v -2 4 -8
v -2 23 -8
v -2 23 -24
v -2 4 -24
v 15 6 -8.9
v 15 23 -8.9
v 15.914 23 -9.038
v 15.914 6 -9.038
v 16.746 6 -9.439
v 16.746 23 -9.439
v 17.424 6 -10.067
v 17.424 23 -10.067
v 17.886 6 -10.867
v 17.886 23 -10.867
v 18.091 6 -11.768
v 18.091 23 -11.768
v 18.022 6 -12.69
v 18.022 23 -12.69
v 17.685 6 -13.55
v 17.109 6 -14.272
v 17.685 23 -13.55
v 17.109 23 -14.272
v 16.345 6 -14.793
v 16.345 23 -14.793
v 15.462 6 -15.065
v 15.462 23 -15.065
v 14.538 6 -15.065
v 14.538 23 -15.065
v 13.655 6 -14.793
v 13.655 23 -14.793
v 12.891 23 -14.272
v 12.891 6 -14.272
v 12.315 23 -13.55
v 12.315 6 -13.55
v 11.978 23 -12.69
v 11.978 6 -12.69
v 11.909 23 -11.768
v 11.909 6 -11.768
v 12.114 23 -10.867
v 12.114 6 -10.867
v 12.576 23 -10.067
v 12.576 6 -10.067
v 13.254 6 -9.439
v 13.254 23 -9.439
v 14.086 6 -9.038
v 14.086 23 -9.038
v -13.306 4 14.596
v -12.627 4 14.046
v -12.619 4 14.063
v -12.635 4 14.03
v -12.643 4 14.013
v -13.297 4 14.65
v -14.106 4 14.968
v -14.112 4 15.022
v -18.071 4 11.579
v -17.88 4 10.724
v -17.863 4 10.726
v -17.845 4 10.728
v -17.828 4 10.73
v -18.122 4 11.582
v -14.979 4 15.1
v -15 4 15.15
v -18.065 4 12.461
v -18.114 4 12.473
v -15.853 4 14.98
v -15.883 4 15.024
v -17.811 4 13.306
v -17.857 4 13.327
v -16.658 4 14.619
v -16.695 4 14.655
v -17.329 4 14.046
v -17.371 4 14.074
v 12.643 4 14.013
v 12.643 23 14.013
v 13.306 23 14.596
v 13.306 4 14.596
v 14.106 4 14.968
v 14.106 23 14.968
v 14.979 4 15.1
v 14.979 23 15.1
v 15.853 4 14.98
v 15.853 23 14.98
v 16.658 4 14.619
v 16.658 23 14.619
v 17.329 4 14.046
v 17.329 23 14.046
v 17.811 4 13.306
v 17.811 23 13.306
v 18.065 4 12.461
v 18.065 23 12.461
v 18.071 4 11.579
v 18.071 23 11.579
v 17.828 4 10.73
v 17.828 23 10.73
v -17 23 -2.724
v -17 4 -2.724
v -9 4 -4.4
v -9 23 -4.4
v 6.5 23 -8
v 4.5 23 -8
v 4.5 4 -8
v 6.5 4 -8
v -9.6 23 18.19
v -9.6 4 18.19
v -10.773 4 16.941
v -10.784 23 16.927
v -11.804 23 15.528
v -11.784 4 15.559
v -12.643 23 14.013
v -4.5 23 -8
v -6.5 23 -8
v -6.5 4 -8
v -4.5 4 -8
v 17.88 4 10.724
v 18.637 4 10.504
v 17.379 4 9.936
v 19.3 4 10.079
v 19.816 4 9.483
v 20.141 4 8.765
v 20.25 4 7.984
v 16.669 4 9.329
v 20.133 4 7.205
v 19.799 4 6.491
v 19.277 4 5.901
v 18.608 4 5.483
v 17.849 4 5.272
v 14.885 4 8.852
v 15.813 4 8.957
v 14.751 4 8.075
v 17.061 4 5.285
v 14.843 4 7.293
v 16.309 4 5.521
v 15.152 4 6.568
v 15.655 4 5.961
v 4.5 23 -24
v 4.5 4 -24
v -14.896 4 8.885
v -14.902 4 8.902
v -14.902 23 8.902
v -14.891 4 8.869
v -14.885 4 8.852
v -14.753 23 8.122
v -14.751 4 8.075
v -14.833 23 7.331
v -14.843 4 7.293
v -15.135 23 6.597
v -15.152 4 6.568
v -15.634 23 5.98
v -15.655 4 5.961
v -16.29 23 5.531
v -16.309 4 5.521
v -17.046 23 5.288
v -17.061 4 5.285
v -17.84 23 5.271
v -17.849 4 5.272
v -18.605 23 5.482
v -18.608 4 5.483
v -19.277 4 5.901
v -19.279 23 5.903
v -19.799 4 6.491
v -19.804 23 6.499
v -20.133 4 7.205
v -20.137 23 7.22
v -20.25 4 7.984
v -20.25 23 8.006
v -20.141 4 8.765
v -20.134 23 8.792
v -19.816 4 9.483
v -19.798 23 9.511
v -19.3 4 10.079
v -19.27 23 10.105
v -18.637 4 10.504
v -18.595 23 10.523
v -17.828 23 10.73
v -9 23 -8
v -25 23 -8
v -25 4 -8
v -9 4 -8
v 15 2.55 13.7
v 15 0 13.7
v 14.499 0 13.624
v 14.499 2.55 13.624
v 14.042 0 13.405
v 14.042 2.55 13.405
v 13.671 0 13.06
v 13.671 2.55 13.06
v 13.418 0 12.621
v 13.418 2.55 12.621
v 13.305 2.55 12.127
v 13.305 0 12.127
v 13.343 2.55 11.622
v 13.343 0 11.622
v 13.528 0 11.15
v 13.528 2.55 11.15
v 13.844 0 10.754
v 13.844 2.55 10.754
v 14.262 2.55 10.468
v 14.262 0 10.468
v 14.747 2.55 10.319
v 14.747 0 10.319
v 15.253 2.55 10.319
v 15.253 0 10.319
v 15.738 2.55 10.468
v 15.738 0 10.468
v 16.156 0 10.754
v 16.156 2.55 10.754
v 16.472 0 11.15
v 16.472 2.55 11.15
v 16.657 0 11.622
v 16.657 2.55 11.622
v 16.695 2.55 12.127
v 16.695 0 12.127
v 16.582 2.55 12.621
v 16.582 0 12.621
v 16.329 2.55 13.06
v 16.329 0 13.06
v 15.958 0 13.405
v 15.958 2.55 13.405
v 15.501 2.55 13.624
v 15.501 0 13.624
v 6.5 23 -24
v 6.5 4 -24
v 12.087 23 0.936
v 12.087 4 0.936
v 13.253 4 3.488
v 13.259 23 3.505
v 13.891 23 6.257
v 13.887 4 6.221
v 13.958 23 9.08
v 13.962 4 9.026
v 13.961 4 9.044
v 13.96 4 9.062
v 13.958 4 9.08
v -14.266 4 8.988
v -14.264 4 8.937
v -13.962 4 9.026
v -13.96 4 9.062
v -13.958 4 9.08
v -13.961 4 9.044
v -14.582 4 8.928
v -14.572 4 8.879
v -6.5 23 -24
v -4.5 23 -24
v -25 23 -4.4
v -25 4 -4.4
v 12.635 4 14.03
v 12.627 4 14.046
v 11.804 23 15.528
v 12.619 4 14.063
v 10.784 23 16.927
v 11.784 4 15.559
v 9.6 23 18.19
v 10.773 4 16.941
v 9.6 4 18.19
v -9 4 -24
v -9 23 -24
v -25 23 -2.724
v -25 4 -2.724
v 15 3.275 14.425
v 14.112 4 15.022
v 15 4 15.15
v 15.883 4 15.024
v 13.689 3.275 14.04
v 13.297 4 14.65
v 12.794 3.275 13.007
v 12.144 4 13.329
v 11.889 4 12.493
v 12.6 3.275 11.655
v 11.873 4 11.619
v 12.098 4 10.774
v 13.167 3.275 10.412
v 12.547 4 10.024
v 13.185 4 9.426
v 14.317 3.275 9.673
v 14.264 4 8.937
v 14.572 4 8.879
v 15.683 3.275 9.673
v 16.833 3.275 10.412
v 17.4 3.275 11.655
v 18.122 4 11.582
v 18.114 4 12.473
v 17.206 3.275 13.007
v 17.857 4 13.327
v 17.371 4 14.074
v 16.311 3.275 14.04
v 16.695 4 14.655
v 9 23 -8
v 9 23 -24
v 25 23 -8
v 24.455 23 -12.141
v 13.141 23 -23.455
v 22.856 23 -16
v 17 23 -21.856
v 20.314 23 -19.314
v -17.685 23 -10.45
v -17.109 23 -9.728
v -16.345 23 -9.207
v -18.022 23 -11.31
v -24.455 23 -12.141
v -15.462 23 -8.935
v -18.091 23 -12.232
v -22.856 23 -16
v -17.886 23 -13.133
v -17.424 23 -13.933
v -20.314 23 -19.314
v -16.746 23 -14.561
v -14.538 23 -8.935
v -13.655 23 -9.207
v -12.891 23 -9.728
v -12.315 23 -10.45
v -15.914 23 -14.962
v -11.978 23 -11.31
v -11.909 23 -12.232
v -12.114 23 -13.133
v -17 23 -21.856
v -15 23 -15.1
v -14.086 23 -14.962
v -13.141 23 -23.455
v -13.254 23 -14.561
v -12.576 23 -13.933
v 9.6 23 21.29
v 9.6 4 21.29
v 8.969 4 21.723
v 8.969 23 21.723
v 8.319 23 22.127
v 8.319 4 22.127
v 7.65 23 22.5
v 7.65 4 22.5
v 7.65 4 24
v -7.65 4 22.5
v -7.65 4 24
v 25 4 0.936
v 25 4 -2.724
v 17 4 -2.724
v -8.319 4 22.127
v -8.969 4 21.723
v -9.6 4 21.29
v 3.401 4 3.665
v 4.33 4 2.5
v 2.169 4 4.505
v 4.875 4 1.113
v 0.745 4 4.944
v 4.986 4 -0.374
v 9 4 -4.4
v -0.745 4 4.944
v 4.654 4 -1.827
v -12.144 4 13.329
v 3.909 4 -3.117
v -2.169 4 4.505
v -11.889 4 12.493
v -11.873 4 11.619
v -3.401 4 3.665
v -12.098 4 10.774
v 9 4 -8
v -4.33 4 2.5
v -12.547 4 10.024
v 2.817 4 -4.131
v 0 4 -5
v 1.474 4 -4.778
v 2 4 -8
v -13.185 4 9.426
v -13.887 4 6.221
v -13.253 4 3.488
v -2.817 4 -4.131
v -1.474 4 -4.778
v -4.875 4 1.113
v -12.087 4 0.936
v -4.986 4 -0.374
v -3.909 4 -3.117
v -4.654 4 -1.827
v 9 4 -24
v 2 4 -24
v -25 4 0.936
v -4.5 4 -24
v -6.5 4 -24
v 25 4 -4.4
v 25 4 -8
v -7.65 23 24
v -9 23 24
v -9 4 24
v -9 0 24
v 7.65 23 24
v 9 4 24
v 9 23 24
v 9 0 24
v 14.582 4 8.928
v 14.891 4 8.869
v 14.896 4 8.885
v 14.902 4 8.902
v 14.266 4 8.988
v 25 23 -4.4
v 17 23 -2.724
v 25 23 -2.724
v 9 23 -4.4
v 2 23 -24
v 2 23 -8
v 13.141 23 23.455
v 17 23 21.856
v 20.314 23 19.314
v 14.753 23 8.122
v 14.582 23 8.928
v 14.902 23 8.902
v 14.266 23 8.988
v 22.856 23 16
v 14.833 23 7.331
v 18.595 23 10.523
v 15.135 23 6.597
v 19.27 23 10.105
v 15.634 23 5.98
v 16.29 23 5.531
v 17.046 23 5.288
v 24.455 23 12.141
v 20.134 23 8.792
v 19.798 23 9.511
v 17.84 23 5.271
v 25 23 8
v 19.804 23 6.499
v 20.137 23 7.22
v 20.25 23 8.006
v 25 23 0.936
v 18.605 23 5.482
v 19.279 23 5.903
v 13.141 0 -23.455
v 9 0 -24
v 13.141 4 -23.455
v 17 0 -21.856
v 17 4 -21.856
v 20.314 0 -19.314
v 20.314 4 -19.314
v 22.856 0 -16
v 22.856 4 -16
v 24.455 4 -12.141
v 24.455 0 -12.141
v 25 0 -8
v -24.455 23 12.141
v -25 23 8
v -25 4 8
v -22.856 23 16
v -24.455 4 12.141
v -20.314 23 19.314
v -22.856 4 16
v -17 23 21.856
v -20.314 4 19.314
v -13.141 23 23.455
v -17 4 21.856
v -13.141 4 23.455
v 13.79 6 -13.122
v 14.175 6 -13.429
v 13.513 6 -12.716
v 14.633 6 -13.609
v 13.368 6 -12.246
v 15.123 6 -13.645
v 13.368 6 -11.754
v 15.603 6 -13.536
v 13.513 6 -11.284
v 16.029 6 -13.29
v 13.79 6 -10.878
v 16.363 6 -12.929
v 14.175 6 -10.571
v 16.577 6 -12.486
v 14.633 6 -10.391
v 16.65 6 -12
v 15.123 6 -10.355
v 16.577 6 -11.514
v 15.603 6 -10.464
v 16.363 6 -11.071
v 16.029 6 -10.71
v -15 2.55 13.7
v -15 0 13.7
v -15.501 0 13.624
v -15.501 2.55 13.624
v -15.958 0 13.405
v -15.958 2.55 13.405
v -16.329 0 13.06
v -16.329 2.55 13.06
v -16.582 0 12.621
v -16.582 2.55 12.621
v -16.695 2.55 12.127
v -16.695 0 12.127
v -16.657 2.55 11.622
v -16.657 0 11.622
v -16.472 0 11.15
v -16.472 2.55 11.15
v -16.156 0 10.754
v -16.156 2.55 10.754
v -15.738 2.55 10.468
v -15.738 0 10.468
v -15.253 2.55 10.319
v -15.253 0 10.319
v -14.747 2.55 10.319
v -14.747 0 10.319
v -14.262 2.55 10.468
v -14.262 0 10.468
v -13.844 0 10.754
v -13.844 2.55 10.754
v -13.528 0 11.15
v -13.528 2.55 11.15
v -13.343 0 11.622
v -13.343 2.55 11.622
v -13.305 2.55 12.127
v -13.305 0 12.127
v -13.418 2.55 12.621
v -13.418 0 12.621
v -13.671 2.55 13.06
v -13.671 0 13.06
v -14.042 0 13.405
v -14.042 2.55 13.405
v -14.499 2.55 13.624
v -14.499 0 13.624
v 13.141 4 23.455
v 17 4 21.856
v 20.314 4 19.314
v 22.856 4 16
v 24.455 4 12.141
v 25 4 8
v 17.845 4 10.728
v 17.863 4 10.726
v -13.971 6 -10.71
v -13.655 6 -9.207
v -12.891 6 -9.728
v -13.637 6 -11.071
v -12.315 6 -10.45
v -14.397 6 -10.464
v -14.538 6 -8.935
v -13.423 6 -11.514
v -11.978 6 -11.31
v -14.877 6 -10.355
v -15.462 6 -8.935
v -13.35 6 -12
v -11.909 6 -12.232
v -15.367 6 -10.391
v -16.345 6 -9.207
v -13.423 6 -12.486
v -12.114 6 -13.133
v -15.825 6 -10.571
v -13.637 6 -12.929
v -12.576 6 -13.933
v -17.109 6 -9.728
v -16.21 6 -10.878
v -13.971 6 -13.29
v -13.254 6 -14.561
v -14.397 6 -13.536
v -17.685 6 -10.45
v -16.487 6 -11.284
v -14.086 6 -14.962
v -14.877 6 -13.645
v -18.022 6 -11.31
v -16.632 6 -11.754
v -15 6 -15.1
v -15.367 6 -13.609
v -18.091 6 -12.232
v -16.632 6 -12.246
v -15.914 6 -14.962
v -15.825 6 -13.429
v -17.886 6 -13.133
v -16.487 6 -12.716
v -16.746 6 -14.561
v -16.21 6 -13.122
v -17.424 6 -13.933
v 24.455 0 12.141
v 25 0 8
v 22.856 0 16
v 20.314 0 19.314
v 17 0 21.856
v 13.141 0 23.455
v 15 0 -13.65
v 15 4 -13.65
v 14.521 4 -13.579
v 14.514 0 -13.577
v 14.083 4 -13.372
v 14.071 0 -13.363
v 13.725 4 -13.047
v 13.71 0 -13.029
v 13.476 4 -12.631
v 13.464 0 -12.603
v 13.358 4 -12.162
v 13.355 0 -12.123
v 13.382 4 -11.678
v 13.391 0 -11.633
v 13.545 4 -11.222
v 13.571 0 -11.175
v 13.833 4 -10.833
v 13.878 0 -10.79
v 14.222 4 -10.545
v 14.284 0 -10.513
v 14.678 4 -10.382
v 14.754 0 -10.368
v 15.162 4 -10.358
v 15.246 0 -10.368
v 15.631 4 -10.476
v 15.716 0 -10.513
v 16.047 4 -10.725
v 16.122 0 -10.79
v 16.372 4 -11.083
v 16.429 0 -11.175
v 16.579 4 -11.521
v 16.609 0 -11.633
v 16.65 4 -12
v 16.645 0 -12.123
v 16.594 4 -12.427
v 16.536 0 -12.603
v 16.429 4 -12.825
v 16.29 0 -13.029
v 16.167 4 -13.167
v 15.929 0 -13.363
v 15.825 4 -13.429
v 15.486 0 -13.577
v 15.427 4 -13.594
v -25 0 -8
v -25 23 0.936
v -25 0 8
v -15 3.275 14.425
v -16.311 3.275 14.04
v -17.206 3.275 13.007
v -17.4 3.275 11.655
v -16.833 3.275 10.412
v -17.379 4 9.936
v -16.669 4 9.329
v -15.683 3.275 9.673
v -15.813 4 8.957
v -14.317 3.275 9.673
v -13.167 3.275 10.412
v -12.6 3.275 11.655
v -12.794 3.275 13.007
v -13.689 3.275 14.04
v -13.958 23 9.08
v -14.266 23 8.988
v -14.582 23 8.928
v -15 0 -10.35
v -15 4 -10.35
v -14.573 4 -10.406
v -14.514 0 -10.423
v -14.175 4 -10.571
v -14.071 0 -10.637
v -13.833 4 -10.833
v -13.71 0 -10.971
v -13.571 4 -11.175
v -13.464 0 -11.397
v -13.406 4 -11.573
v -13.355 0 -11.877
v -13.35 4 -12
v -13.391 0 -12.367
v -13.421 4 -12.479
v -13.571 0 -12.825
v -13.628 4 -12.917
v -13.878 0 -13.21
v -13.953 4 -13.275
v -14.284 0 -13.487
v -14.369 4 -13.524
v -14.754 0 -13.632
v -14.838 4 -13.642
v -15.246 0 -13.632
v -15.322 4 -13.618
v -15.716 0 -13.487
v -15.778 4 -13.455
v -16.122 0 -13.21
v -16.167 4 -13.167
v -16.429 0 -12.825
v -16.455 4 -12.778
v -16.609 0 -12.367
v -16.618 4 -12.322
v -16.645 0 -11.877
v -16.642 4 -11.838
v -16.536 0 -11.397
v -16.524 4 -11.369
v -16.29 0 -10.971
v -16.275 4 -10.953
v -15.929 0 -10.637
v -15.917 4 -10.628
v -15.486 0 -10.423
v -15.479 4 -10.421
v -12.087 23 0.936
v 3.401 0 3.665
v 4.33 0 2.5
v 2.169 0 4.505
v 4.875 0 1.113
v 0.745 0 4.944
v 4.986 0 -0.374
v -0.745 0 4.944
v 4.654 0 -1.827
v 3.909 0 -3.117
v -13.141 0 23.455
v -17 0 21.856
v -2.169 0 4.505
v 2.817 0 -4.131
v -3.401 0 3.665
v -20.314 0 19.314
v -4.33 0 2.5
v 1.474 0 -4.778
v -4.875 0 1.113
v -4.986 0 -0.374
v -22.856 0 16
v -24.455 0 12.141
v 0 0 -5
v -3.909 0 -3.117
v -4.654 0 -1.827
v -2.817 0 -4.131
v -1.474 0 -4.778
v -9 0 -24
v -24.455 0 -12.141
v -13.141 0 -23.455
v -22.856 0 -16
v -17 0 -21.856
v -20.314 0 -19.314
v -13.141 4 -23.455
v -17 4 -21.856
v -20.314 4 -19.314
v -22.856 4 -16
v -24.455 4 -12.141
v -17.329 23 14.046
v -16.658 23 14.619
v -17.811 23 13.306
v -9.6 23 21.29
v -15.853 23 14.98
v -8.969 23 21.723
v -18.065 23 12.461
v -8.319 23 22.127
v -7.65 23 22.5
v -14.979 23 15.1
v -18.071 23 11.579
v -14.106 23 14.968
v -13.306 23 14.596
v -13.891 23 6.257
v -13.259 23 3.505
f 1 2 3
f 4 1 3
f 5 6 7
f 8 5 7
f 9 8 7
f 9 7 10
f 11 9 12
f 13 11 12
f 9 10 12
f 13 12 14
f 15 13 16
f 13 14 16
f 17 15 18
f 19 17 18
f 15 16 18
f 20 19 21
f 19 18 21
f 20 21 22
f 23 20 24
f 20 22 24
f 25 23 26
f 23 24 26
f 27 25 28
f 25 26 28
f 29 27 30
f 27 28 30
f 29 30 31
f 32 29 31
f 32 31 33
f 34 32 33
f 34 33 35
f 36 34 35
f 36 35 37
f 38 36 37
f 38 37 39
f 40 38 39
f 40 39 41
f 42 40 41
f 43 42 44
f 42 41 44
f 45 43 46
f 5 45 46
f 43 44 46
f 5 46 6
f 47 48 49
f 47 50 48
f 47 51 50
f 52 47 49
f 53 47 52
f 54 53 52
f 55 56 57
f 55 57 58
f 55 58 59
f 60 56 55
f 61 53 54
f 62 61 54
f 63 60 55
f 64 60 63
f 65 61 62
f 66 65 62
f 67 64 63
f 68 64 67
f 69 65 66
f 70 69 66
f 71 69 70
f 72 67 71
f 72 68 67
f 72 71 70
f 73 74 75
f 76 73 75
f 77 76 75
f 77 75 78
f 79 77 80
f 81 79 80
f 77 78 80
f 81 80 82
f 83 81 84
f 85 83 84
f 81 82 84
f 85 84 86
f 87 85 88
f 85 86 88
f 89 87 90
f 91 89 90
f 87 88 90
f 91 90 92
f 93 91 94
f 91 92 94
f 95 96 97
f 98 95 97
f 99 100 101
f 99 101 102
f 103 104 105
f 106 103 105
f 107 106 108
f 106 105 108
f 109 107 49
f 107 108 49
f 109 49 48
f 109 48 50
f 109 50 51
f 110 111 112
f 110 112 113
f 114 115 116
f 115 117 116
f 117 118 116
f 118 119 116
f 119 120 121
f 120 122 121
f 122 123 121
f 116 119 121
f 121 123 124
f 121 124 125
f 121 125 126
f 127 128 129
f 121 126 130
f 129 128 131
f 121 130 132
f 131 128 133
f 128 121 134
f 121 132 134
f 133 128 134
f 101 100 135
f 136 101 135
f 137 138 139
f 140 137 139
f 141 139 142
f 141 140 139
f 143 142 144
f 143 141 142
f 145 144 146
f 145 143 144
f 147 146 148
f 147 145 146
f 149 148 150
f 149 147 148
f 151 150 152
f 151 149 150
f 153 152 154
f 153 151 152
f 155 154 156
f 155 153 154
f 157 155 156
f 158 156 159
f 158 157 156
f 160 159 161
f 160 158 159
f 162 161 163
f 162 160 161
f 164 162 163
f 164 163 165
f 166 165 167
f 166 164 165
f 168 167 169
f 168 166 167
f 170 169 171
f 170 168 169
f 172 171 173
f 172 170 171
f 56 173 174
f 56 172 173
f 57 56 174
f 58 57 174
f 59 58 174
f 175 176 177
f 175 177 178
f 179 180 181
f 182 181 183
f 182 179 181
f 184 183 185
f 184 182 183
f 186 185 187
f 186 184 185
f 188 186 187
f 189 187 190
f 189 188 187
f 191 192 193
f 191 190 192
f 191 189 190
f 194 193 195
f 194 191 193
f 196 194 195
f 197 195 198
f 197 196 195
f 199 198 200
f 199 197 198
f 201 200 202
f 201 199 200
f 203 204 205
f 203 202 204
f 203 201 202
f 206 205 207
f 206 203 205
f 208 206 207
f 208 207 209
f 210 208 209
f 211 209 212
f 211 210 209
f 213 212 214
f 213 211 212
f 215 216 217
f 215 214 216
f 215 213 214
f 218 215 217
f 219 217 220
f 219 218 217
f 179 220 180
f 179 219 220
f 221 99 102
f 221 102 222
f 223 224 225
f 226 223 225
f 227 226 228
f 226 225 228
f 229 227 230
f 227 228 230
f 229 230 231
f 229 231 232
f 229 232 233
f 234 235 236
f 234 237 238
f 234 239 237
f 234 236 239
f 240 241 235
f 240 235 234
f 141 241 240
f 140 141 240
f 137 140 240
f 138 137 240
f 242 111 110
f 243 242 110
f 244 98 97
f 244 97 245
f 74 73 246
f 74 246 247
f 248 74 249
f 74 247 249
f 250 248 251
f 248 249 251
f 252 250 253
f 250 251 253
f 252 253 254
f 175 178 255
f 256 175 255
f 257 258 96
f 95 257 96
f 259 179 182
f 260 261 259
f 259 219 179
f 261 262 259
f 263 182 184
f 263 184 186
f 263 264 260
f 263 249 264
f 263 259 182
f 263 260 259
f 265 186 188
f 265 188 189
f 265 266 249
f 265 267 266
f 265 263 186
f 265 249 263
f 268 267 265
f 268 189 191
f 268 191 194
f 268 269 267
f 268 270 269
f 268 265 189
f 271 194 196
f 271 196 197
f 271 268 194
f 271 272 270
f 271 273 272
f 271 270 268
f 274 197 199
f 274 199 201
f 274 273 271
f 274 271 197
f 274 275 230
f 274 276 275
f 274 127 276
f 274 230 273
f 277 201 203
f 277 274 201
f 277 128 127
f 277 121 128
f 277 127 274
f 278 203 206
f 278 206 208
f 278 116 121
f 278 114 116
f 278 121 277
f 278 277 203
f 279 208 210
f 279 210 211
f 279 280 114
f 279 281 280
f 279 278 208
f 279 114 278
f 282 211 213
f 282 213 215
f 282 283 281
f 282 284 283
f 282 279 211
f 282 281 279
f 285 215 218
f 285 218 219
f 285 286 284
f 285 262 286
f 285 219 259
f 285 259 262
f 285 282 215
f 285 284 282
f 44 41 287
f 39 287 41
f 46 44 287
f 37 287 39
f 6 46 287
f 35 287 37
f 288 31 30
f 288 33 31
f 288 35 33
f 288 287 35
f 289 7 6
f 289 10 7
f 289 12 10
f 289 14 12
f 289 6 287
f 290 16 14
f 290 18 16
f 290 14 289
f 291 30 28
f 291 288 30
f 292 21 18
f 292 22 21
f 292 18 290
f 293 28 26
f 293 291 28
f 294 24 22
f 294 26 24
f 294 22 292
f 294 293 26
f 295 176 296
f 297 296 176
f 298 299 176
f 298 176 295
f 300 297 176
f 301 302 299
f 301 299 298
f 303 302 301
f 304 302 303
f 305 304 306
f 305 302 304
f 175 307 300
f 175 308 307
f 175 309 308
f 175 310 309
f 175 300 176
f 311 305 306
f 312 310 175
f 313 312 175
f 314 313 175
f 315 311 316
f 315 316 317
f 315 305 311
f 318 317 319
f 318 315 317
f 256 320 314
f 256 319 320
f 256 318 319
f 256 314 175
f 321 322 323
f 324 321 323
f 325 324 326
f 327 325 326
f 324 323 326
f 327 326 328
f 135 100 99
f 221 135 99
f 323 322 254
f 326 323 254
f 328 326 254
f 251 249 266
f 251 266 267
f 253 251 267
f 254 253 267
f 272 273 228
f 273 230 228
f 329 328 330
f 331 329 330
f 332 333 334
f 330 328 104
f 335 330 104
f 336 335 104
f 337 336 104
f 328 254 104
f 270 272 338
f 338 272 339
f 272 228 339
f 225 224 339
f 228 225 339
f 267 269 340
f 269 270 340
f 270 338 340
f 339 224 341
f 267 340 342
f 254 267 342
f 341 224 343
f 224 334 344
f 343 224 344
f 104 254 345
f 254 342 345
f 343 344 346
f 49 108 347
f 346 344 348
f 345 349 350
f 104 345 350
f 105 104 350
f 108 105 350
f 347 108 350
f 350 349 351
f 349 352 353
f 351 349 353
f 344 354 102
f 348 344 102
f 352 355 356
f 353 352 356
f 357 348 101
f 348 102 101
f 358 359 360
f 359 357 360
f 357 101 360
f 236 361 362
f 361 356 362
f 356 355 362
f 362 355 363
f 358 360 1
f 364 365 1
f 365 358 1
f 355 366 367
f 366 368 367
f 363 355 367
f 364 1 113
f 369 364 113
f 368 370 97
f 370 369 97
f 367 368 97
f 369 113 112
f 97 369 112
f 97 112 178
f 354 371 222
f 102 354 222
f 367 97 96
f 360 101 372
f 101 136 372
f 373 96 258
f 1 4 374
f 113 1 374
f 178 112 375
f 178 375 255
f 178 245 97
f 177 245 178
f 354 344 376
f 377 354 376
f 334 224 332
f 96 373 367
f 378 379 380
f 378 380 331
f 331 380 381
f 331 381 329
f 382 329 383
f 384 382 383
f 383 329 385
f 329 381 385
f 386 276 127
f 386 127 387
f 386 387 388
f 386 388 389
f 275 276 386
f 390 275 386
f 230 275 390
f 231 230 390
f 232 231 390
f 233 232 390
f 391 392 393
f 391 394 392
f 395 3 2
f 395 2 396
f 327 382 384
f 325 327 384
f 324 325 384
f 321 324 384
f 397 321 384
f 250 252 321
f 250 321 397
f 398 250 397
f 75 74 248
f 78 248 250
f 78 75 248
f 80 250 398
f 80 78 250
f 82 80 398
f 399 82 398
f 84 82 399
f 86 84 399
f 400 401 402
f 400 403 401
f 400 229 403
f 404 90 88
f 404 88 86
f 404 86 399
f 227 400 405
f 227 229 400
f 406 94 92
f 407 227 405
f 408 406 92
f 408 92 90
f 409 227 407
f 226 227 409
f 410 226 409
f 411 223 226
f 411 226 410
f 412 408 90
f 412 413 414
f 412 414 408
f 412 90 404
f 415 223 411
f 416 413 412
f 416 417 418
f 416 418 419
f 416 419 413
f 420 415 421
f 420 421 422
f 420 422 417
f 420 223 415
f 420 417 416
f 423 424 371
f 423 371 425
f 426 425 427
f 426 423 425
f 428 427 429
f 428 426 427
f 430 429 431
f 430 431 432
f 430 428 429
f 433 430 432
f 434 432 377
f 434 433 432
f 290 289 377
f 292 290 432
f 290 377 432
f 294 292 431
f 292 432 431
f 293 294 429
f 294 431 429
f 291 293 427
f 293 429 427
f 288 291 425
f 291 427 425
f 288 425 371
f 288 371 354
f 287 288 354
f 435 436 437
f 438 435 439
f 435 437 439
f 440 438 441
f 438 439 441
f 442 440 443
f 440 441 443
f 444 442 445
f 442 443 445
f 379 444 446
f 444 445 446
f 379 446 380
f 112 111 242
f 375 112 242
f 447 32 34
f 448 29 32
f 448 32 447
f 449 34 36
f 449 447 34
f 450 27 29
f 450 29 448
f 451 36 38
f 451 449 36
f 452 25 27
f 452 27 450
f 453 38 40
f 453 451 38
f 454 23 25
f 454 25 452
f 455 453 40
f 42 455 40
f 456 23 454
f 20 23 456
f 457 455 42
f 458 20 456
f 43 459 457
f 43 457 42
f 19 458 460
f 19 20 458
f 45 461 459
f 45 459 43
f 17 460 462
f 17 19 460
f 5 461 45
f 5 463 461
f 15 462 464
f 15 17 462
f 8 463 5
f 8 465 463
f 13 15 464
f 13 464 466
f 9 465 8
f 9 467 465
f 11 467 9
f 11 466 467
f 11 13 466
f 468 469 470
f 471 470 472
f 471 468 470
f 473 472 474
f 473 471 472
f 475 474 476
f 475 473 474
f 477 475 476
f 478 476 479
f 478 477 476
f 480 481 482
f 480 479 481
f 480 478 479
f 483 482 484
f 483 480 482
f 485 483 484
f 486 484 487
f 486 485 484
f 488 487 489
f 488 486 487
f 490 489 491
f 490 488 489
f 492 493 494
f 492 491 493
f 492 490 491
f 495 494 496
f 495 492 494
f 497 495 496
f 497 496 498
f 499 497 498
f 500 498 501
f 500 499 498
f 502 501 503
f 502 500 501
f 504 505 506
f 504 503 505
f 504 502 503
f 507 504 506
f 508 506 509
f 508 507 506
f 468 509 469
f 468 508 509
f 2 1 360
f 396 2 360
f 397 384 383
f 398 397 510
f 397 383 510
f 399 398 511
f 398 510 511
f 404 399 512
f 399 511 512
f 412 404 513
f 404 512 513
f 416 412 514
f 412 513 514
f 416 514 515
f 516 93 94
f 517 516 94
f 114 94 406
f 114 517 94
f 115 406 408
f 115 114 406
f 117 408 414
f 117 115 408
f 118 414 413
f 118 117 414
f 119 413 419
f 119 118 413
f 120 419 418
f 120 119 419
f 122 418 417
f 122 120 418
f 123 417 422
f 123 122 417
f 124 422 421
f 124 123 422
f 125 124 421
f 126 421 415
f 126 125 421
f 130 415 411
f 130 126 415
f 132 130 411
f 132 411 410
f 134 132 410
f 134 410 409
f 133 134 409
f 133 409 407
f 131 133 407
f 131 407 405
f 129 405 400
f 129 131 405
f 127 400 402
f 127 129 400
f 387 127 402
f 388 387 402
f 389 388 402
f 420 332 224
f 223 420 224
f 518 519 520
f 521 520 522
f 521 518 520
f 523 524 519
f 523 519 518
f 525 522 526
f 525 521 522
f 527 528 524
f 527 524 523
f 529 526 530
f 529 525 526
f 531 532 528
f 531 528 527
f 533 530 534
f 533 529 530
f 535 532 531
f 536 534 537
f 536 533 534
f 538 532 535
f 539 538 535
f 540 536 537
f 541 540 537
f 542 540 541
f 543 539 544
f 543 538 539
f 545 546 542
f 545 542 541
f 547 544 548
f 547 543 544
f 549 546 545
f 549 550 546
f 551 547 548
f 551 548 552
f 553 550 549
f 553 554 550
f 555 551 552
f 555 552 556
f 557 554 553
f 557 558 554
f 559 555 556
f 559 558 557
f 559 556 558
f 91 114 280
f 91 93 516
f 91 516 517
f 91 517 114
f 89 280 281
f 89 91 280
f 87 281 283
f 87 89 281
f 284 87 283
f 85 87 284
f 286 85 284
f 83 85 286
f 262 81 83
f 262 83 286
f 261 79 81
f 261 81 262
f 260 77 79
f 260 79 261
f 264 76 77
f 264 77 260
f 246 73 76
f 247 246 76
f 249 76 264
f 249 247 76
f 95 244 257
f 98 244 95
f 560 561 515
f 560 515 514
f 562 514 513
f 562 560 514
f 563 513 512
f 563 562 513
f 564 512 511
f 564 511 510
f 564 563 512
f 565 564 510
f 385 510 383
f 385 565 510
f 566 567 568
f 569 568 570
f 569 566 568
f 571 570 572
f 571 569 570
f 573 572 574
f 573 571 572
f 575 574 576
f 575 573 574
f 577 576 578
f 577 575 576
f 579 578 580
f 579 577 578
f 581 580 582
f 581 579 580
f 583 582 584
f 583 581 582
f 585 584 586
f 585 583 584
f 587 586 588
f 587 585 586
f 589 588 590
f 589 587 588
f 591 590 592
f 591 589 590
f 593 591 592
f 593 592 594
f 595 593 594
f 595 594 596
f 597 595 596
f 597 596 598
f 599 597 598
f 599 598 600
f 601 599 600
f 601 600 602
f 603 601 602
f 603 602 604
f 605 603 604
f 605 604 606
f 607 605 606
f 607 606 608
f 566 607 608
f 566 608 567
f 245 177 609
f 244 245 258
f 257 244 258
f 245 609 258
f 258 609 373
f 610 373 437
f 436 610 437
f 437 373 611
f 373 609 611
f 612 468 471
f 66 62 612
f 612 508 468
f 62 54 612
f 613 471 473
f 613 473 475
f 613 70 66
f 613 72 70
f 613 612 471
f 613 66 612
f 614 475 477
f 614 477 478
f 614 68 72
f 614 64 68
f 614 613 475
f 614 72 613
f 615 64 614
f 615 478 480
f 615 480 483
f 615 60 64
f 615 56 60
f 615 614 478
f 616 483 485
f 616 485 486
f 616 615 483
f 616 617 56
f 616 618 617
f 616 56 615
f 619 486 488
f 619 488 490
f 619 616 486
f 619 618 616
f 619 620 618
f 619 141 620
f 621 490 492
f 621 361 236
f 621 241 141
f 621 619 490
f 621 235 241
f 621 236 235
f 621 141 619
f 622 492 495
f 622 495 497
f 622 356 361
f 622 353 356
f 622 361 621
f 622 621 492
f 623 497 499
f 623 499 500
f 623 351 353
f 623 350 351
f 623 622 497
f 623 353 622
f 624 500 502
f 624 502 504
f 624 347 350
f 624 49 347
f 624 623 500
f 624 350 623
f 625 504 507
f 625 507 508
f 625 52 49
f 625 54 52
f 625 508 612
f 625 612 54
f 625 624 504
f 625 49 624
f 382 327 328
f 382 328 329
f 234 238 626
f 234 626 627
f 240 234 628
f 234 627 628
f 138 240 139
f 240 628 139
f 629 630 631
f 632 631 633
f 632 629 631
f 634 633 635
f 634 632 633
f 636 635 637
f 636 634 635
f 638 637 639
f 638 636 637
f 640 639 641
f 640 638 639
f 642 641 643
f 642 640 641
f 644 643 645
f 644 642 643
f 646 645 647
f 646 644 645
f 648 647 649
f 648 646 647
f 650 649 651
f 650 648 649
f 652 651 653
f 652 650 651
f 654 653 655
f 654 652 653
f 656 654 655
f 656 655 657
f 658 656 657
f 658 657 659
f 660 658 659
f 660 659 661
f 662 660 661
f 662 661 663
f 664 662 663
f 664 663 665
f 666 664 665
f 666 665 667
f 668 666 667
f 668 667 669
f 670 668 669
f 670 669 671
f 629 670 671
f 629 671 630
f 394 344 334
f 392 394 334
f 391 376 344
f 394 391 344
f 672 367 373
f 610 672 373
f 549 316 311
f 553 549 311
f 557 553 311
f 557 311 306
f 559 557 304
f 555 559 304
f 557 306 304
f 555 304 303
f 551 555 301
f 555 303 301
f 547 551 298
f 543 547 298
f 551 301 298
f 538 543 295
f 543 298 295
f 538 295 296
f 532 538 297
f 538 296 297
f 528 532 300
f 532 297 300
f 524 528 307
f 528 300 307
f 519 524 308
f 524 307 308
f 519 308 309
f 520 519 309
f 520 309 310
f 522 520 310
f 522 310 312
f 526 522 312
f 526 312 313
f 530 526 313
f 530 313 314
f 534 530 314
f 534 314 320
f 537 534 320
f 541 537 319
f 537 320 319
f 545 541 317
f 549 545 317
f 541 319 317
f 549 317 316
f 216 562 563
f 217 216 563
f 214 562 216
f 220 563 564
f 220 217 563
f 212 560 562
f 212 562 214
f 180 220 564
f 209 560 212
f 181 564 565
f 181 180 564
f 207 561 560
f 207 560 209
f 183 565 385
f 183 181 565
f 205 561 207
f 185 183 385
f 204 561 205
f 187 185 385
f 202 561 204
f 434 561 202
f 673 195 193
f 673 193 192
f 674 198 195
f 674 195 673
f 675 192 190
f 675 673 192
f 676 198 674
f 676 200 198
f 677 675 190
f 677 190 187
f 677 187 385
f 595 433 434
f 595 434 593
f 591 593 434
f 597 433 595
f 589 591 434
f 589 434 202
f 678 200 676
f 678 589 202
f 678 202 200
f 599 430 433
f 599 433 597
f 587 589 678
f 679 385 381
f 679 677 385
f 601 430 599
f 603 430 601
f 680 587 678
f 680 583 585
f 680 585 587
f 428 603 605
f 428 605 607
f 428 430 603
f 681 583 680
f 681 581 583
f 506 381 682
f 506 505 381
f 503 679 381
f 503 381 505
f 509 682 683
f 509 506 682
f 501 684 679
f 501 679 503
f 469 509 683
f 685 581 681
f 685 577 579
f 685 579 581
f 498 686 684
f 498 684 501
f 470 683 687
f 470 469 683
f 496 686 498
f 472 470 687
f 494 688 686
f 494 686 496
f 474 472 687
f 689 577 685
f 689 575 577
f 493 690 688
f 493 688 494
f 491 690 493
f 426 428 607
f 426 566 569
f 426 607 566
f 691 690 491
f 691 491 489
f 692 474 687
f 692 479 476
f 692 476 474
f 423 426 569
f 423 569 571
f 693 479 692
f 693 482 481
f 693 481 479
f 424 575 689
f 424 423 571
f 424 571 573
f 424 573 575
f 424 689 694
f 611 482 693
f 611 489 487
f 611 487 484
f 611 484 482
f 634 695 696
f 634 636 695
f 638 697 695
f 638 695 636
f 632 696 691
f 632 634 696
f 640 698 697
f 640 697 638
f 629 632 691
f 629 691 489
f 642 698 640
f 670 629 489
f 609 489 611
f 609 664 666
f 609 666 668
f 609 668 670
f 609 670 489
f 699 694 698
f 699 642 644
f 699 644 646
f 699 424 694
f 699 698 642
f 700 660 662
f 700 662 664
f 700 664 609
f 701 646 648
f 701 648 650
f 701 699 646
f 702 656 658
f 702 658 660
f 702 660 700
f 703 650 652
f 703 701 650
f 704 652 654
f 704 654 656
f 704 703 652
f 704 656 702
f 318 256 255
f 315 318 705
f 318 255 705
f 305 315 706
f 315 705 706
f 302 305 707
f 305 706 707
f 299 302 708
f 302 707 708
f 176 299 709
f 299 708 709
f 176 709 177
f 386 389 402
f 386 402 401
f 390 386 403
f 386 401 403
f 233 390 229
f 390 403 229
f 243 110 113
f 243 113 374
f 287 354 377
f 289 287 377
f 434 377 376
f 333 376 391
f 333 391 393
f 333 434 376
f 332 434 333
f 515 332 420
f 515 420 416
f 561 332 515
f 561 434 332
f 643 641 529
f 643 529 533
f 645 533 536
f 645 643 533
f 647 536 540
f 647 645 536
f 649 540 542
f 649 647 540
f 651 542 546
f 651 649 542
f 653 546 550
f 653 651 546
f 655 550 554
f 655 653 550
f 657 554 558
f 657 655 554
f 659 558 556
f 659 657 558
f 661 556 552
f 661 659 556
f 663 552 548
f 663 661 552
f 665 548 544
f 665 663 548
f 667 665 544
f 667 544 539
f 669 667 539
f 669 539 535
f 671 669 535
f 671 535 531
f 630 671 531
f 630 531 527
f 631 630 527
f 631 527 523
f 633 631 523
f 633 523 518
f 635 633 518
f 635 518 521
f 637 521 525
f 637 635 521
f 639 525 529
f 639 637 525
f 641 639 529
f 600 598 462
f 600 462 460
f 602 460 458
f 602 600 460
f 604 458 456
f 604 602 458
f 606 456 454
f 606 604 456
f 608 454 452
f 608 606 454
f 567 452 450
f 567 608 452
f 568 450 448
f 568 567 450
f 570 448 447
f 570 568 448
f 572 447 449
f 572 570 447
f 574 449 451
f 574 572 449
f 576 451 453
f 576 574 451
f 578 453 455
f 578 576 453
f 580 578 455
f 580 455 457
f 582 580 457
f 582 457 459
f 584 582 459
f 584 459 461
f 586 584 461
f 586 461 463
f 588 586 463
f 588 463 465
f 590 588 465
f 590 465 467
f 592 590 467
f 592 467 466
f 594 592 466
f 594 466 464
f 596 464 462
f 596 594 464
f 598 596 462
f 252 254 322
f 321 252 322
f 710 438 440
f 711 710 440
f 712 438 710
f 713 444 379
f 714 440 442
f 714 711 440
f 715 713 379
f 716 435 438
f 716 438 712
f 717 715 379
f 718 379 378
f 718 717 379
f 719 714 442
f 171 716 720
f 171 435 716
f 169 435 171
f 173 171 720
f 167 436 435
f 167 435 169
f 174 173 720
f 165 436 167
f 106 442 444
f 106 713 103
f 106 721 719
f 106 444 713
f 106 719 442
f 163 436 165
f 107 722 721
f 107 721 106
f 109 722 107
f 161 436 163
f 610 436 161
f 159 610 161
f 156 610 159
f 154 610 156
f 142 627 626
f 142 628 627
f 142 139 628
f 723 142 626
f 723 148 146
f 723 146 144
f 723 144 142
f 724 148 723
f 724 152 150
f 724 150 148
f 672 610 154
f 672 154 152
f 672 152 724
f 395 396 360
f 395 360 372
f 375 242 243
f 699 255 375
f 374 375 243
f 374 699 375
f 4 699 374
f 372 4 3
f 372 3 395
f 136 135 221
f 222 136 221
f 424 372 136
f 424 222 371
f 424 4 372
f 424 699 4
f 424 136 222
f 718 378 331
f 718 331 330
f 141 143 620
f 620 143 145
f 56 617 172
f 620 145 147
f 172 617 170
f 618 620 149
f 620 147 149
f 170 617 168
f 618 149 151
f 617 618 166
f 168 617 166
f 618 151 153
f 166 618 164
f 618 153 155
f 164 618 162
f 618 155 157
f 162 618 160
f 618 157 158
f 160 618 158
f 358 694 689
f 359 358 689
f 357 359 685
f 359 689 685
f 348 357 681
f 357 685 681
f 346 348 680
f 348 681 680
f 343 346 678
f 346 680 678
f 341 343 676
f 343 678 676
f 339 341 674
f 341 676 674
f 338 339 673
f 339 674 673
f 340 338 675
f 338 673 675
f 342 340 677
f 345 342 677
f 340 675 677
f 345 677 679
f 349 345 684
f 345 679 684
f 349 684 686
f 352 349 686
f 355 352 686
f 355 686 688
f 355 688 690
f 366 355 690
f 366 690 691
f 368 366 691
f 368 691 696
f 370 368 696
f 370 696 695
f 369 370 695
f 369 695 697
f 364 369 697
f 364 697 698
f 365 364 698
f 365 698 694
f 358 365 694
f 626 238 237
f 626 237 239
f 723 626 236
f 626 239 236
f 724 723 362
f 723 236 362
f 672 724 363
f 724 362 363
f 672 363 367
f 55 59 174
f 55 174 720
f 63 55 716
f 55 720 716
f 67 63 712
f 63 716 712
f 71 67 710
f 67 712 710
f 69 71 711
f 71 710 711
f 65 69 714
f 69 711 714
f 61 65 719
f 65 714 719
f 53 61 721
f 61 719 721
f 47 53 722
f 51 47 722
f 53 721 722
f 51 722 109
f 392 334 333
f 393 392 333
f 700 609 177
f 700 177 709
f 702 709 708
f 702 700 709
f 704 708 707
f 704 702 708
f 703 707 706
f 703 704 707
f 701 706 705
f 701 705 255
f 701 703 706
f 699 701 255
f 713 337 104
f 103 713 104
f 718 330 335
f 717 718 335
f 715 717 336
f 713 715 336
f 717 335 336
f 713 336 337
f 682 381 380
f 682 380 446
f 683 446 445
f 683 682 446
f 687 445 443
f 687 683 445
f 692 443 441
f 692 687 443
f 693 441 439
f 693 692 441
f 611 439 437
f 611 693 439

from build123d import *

# Parameters (mm, degrees)
SKETCH1_R                                    = 1.650000221024274
BOSS_EXTRUDE1_DEPTH                          = 4
BOSS_EXTRUDE2_OUTLINE_R                      = 2.75
BOSS_EXTRUDE2_OUTLINE_R_2                    = 1.650000221
BOSS_EXTRUDE2_OUTLINE_W                      = 2.000000000000001
BOSS_EXTRUDE2_OUTLINE_H                      = 16.000000209
BOSS_EXTRUDE2_OUTLINE_W_2                    = 4
BOSS_EXTRUDE2_DEPTH                          = 19
SKETCH6_R                                    = 3.1000000000000005
SKETCH6_R_2                                  = 3.0999999999999988
CUT_EXTRUDE2_DEPTH                           = 17
SKETCH7_R                                    = 3.1000000000000005
SKETCH7_R_2                                  = 3.0999999999999988
CUT_EXTRUDE3_DEPTH                           = 2
SKETCH11_R                                   = 5
CUT_EXTRUDE4_DEPTH                           = 10
CSK_FOR_M3_CROSS_RECESS_FLAT_HEAD_SC_2_COUNT = 2
CSK_FOR_M3_CROSS_RECESS_FLAT_HEAD_SC_2_PITCH = 29.999999886192118


# Read off the part's stored shape, not the designer's step: Boss-Extrude2
with BuildPart() as part:
    # Sketch1 → Boss-Extrude1 (new body)
    with BuildSketch(Plane(origin=(0, 0, 0), x_dir=(1, 0, 0), z_dir=(0, 1, 0))):
        with BuildLine():
            Line((-9.000000372528914, 24.000000208616257), (9.000000372528918, 24.000000208616257))
            ThreePointArc((9.000000372528918, 24.000000208616257), (20.31370887151379, 19.313708707601016), (25.00000037252903, 8.000000208616145))
            Line((25.00000037252903, 8.000000208616145), (25.00000037252903, -8.000000208616145))
            ThreePointArc((25.00000037252903, -8.000000208616145), (20.31370887151379, -19.313708707601016), (9.000000372528918, -24.000000208616257))
            Line((9.000000372528918, -24.000000208616257), (-9.000000372528914, -24.000000208616257))
            ThreePointArc((-9.000000372528914, -24.000000208616257), (-20.313708871513793, -19.31370870760102), (-25.00000037252903, -8.000000208616145))
            Line((-25.00000037252903, -8.000000208616145), (-25.00000037252903, 8.000000208616145))
            ThreePointArc((-25.00000037252903, 8.000000208616145), (-20.31370887151379, 19.313708707601016), (-9.000000372528914, 24.000000208616257))
        make_face()
        with Locations(Location((-14.999999943096059, 12.000001695688482, 0), (0, 0, 270))):
            Circle(SKETCH1_R, mode=Mode.SUBTRACT)
        with Locations(Location((14.999999943096059, 12.00000169568849, 0), (0, 0, 90))):
            Circle(SKETCH1_R, mode=Mode.SUBTRACT)
        with Locations(Location((14.999999943096059, -12.00000169568849, 0), (0, 0, 270))):
            Circle(SKETCH1_R, mode=Mode.SUBTRACT)
        with Locations(Location((-14.999999943096059, -12.000001695688482, 0), (0, 0, 90))):
            Circle(SKETCH1_R, mode=Mode.SUBTRACT)
    extrude(amount=BOSS_EXTRUDE1_DEPTH)

    # Boss-Extrude2 outline → Boss-Extrude2 (add)
    # profile 1 of 9: a face of its own
    with BuildSketch(Plane(origin=(0, 4, 0), x_dir=(1, 0, 0), z_dir=(0, 1, 0))):
        with BuildLine():
            ThreePointArc((-25.000000373, -8.000000209), (-20.313708872, -19.313708708), (-9.000000373, -24.000000209))
            Line((-9.000000373, -24.000000209), (-7.65, -24.000000209))
            Line((-7.65, -24.000000209), (-7.65, -22.5))
            ThreePointArc((-7.65, -22.5), (-8.646208076, -21.928947768), (-9.6, -21.289563574))
            Line((-9.6, -21.289563574), (-9.6, -18.190191362))
            ThreePointArc((-9.6, -18.190191362), (-11.86645746, -15.428807936), (-13.360259128, -12.183715576))
            ThreePointArc((-13.360259128, -12.183715576), (-16.594287762, -12.425145296), (-13.669460049, -11.024212621))
            ThreePointArc((-13.669460049, -11.024212621), (-13.83087583, -5.830466926), (-12.086943849, -0.935597096))
            Line((-12.086943849, -0.935597096), (-25.000000373, -0.935597096))
            Line((-25.000000373, -0.935597096), (-25.000000373, -8.000000209))
        make_face()
        with Locations((-17.5, -8)):
            Circle(BOSS_EXTRUDE2_OUTLINE_R, mode=Mode.SUBTRACT)
    # profile 2 of 9: a face of its own
    with BuildSketch(Plane(origin=(0, 4, 0), x_dir=(1, 0, 0), z_dir=(0, 1, 0))):
        with BuildLine():
            Line((7.65, -22.5), (7.65, -24.000000209))
            Line((7.65, -24.000000209), (9.000000373, -24.000000209))
            ThreePointArc((9.000000373, -24.000000209), (20.313708872, -19.313708708), (25.000000373, -8.000000209))
            Line((25.000000373, -8.000000209), (25.000000373, -0.935597096))
            Line((25.000000373, -0.935597096), (12.086943849, -0.935597096))
            ThreePointArc((12.086943849, -0.935597096), (13.83087583, -5.830466926), (13.669460049, -11.024212621))
            ThreePointArc((13.669460049, -11.024212621), (16.594287762, -12.425145296), (13.360259128, -12.183715576))
            ThreePointArc((13.360259128, -12.183715576), (11.86645746, -15.428807936), (9.6, -18.190191362))
            Line((9.6, -18.190191362), (9.6, -21.289563574))
            ThreePointArc((9.6, -21.289563574), (8.646208076, -21.928947768), (7.65, -22.5))
        make_face()
        with Locations((17.5, -8)):
            Circle(BOSS_EXTRUDE2_OUTLINE_R, mode=Mode.SUBTRACT)
    # profile 3 of 9: a face of its own
    with BuildSketch(Plane(origin=(0, 4, 0), x_dir=(1, 0, 0), z_dir=(0, 1, 0))):
        Polygon((-25.000000373, 4.399596768), (-25.000000373, 2.723805295), (-17, 2.723805295), (-9, 4.399596768), align=None)
    # profile 4 of 9: a face of its own
    with BuildSketch(Plane(origin=(0, 4, 0), x_dir=(1, 0, 0), z_dir=(0, 1, 0))):
        with BuildLine():
            ThreePointArc((-9.000000373, 24.000000209), (-20.313708872, 19.313708708), (-25.000000373, 8.000000209))
            Line((-25.000000373, 8.000000209), (-9, 8))
            Line((-9, 8), (-9.000000373, 24.000000209))
        make_face()
        with Locations((-14.999999943, 12.000001696)):
            Circle(BOSS_EXTRUDE2_OUTLINE_R_2, mode=Mode.SUBTRACT)
    # profile 5 of 9: a face of its own
    with BuildSketch(Plane(origin=(0, 4, 0), x_dir=(1, 0, 0), z_dir=(0, 1, 0))):
        Polygon((17, 2.723805295), (25.000000373, 2.723805295), (25.000000373, 4.399596768), (9, 4.399596768), align=None)
    # profile 6 of 9: a face of its own
    with BuildSketch(Plane(origin=(0, 4, 0), x_dir=(1, 0, 0), z_dir=(0, 1, 0))):
        with Locations((-5.5, 16.0000001045)):
            Rectangle(BOSS_EXTRUDE2_OUTLINE_W, BOSS_EXTRUDE2_OUTLINE_H)
    # profile 7 of 9: a face of its own
    with BuildSketch(Plane(origin=(0, 4, 0), x_dir=(1, 0, 0), z_dir=(0, 1, 0))):
        with BuildLine():
            Line((9, 8), (25.000000373, 8.000000209))
            ThreePointArc((25.000000373, 8.000000209), (20.313708872, 19.313708708), (9.000000373, 24.000000209))
            Line((9.000000373, 24.000000209), (9, 8))
        make_face()
        with Locations((14.999999943, 12.000001696)):
            Circle(BOSS_EXTRUDE2_OUTLINE_R_2, mode=Mode.SUBTRACT)
    # profile 8 of 9: a face of its own
    with BuildSketch(Plane(origin=(0, 4, 0), x_dir=(1, 0, 0), z_dir=(0, 1, 0))):
        with Locations((0, 16.0000001045)):
            Rectangle(BOSS_EXTRUDE2_OUTLINE_W_2, BOSS_EXTRUDE2_OUTLINE_H)
    # profile 9 of 9: a face of its own
    with BuildSketch(Plane(origin=(0, 4, 0), x_dir=(1, 0, 0), z_dir=(0, 1, 0))):
        with Locations((5.5, 16.0000001045)):
            Rectangle(BOSS_EXTRUDE2_OUTLINE_W, BOSS_EXTRUDE2_OUTLINE_H)
    extrude(amount=BOSS_EXTRUDE2_DEPTH)

    # Sketch6 → Cut-Extrude2 (cut)
    with BuildSketch(Plane(origin=(0, 23, 0), x_dir=(1, 0, 0), z_dir=(0, 1, 0))):
        with Locations((-14.999999943096059, -12.000001695688482)):
            Circle(SKETCH6_R)
        with Locations((14.999999943096062, -12.000001695688479)):
            Circle(SKETCH6_R_2)
        with Locations(Location((14.999999943096059, 12.000001695688482, 0), (0, 0, 270))):
            Circle(SKETCH6_R_2)
        with Locations(Location((-14.999999943096062, 12.000001695688479, 0), (0, 0, 90))):
            Circle(SKETCH6_R)
    extrude(amount=-CUT_EXTRUDE2_DEPTH, mode=Mode.SUBTRACT)

    # Sketch7 → Cut-Extrude3 (cut)
    with BuildSketch(Plane(origin=(0, 5.999999999999998, 0), x_dir=(1, 0, 0), z_dir=(0, 1, 0))):
        with Locations((-14.999999943096059, -12.000001695688482)):
            Circle(SKETCH7_R)
        with Locations((14.999999943096062, -12.000001695688479)):
            Circle(SKETCH7_R_2)
    extrude(amount=-CUT_EXTRUDE3_DEPTH, mode=Mode.SUBTRACT)

    # Sketch11 → Cut-Extrude4 (cut)
    with BuildSketch(Plane.XZ):
        with Locations(Location((0, 0, 0), (0, 0, 270))):
            Circle(SKETCH11_R)
    extrude(amount=-CUT_EXTRUDE4_DEPTH, mode=Mode.SUBTRACT)

    # Sketch10 → CSK for M3 Cross Recess Flat Head Screw1 (revolve, cut)
    with BuildSketch(Plane(origin=(-14.999999943096059, 4, 12.000001695688482), x_dir=(0, 0, 1), z_dir=(1, 0, 0))):
        Polygon((0, 0), (-7.6e-15, 31.021463052346846), (1.6999999999999862, 30), (1.699999999999996, 1.45), (3.15, -1.73e-15), align=None)
    csk_for_m3_cross_recess_flat_head_screw1 = revolve(axis=Axis((-14.999999943096059, 10.34999999999999, 12.000001695688482), (0, -1, 0)), mode=Mode.SUBTRACT)

    # CSK for M3 Cross Recess Flat Head Sc 2: CSK for M3 Cross Recess Flat Head Screw1 ×2
    with Locations(*[(i * CSK_FOR_M3_CROSS_RECESS_FLAT_HEAD_SC_2_PITCH, 0, 0) for i in range(1, CSK_FOR_M3_CROSS_RECESS_FLAT_HEAD_SC_2_COUNT)]):
        add(csk_for_m3_cross_recess_flat_head_screw1, mode=Mode.SUBTRACT)


solid = part.part
